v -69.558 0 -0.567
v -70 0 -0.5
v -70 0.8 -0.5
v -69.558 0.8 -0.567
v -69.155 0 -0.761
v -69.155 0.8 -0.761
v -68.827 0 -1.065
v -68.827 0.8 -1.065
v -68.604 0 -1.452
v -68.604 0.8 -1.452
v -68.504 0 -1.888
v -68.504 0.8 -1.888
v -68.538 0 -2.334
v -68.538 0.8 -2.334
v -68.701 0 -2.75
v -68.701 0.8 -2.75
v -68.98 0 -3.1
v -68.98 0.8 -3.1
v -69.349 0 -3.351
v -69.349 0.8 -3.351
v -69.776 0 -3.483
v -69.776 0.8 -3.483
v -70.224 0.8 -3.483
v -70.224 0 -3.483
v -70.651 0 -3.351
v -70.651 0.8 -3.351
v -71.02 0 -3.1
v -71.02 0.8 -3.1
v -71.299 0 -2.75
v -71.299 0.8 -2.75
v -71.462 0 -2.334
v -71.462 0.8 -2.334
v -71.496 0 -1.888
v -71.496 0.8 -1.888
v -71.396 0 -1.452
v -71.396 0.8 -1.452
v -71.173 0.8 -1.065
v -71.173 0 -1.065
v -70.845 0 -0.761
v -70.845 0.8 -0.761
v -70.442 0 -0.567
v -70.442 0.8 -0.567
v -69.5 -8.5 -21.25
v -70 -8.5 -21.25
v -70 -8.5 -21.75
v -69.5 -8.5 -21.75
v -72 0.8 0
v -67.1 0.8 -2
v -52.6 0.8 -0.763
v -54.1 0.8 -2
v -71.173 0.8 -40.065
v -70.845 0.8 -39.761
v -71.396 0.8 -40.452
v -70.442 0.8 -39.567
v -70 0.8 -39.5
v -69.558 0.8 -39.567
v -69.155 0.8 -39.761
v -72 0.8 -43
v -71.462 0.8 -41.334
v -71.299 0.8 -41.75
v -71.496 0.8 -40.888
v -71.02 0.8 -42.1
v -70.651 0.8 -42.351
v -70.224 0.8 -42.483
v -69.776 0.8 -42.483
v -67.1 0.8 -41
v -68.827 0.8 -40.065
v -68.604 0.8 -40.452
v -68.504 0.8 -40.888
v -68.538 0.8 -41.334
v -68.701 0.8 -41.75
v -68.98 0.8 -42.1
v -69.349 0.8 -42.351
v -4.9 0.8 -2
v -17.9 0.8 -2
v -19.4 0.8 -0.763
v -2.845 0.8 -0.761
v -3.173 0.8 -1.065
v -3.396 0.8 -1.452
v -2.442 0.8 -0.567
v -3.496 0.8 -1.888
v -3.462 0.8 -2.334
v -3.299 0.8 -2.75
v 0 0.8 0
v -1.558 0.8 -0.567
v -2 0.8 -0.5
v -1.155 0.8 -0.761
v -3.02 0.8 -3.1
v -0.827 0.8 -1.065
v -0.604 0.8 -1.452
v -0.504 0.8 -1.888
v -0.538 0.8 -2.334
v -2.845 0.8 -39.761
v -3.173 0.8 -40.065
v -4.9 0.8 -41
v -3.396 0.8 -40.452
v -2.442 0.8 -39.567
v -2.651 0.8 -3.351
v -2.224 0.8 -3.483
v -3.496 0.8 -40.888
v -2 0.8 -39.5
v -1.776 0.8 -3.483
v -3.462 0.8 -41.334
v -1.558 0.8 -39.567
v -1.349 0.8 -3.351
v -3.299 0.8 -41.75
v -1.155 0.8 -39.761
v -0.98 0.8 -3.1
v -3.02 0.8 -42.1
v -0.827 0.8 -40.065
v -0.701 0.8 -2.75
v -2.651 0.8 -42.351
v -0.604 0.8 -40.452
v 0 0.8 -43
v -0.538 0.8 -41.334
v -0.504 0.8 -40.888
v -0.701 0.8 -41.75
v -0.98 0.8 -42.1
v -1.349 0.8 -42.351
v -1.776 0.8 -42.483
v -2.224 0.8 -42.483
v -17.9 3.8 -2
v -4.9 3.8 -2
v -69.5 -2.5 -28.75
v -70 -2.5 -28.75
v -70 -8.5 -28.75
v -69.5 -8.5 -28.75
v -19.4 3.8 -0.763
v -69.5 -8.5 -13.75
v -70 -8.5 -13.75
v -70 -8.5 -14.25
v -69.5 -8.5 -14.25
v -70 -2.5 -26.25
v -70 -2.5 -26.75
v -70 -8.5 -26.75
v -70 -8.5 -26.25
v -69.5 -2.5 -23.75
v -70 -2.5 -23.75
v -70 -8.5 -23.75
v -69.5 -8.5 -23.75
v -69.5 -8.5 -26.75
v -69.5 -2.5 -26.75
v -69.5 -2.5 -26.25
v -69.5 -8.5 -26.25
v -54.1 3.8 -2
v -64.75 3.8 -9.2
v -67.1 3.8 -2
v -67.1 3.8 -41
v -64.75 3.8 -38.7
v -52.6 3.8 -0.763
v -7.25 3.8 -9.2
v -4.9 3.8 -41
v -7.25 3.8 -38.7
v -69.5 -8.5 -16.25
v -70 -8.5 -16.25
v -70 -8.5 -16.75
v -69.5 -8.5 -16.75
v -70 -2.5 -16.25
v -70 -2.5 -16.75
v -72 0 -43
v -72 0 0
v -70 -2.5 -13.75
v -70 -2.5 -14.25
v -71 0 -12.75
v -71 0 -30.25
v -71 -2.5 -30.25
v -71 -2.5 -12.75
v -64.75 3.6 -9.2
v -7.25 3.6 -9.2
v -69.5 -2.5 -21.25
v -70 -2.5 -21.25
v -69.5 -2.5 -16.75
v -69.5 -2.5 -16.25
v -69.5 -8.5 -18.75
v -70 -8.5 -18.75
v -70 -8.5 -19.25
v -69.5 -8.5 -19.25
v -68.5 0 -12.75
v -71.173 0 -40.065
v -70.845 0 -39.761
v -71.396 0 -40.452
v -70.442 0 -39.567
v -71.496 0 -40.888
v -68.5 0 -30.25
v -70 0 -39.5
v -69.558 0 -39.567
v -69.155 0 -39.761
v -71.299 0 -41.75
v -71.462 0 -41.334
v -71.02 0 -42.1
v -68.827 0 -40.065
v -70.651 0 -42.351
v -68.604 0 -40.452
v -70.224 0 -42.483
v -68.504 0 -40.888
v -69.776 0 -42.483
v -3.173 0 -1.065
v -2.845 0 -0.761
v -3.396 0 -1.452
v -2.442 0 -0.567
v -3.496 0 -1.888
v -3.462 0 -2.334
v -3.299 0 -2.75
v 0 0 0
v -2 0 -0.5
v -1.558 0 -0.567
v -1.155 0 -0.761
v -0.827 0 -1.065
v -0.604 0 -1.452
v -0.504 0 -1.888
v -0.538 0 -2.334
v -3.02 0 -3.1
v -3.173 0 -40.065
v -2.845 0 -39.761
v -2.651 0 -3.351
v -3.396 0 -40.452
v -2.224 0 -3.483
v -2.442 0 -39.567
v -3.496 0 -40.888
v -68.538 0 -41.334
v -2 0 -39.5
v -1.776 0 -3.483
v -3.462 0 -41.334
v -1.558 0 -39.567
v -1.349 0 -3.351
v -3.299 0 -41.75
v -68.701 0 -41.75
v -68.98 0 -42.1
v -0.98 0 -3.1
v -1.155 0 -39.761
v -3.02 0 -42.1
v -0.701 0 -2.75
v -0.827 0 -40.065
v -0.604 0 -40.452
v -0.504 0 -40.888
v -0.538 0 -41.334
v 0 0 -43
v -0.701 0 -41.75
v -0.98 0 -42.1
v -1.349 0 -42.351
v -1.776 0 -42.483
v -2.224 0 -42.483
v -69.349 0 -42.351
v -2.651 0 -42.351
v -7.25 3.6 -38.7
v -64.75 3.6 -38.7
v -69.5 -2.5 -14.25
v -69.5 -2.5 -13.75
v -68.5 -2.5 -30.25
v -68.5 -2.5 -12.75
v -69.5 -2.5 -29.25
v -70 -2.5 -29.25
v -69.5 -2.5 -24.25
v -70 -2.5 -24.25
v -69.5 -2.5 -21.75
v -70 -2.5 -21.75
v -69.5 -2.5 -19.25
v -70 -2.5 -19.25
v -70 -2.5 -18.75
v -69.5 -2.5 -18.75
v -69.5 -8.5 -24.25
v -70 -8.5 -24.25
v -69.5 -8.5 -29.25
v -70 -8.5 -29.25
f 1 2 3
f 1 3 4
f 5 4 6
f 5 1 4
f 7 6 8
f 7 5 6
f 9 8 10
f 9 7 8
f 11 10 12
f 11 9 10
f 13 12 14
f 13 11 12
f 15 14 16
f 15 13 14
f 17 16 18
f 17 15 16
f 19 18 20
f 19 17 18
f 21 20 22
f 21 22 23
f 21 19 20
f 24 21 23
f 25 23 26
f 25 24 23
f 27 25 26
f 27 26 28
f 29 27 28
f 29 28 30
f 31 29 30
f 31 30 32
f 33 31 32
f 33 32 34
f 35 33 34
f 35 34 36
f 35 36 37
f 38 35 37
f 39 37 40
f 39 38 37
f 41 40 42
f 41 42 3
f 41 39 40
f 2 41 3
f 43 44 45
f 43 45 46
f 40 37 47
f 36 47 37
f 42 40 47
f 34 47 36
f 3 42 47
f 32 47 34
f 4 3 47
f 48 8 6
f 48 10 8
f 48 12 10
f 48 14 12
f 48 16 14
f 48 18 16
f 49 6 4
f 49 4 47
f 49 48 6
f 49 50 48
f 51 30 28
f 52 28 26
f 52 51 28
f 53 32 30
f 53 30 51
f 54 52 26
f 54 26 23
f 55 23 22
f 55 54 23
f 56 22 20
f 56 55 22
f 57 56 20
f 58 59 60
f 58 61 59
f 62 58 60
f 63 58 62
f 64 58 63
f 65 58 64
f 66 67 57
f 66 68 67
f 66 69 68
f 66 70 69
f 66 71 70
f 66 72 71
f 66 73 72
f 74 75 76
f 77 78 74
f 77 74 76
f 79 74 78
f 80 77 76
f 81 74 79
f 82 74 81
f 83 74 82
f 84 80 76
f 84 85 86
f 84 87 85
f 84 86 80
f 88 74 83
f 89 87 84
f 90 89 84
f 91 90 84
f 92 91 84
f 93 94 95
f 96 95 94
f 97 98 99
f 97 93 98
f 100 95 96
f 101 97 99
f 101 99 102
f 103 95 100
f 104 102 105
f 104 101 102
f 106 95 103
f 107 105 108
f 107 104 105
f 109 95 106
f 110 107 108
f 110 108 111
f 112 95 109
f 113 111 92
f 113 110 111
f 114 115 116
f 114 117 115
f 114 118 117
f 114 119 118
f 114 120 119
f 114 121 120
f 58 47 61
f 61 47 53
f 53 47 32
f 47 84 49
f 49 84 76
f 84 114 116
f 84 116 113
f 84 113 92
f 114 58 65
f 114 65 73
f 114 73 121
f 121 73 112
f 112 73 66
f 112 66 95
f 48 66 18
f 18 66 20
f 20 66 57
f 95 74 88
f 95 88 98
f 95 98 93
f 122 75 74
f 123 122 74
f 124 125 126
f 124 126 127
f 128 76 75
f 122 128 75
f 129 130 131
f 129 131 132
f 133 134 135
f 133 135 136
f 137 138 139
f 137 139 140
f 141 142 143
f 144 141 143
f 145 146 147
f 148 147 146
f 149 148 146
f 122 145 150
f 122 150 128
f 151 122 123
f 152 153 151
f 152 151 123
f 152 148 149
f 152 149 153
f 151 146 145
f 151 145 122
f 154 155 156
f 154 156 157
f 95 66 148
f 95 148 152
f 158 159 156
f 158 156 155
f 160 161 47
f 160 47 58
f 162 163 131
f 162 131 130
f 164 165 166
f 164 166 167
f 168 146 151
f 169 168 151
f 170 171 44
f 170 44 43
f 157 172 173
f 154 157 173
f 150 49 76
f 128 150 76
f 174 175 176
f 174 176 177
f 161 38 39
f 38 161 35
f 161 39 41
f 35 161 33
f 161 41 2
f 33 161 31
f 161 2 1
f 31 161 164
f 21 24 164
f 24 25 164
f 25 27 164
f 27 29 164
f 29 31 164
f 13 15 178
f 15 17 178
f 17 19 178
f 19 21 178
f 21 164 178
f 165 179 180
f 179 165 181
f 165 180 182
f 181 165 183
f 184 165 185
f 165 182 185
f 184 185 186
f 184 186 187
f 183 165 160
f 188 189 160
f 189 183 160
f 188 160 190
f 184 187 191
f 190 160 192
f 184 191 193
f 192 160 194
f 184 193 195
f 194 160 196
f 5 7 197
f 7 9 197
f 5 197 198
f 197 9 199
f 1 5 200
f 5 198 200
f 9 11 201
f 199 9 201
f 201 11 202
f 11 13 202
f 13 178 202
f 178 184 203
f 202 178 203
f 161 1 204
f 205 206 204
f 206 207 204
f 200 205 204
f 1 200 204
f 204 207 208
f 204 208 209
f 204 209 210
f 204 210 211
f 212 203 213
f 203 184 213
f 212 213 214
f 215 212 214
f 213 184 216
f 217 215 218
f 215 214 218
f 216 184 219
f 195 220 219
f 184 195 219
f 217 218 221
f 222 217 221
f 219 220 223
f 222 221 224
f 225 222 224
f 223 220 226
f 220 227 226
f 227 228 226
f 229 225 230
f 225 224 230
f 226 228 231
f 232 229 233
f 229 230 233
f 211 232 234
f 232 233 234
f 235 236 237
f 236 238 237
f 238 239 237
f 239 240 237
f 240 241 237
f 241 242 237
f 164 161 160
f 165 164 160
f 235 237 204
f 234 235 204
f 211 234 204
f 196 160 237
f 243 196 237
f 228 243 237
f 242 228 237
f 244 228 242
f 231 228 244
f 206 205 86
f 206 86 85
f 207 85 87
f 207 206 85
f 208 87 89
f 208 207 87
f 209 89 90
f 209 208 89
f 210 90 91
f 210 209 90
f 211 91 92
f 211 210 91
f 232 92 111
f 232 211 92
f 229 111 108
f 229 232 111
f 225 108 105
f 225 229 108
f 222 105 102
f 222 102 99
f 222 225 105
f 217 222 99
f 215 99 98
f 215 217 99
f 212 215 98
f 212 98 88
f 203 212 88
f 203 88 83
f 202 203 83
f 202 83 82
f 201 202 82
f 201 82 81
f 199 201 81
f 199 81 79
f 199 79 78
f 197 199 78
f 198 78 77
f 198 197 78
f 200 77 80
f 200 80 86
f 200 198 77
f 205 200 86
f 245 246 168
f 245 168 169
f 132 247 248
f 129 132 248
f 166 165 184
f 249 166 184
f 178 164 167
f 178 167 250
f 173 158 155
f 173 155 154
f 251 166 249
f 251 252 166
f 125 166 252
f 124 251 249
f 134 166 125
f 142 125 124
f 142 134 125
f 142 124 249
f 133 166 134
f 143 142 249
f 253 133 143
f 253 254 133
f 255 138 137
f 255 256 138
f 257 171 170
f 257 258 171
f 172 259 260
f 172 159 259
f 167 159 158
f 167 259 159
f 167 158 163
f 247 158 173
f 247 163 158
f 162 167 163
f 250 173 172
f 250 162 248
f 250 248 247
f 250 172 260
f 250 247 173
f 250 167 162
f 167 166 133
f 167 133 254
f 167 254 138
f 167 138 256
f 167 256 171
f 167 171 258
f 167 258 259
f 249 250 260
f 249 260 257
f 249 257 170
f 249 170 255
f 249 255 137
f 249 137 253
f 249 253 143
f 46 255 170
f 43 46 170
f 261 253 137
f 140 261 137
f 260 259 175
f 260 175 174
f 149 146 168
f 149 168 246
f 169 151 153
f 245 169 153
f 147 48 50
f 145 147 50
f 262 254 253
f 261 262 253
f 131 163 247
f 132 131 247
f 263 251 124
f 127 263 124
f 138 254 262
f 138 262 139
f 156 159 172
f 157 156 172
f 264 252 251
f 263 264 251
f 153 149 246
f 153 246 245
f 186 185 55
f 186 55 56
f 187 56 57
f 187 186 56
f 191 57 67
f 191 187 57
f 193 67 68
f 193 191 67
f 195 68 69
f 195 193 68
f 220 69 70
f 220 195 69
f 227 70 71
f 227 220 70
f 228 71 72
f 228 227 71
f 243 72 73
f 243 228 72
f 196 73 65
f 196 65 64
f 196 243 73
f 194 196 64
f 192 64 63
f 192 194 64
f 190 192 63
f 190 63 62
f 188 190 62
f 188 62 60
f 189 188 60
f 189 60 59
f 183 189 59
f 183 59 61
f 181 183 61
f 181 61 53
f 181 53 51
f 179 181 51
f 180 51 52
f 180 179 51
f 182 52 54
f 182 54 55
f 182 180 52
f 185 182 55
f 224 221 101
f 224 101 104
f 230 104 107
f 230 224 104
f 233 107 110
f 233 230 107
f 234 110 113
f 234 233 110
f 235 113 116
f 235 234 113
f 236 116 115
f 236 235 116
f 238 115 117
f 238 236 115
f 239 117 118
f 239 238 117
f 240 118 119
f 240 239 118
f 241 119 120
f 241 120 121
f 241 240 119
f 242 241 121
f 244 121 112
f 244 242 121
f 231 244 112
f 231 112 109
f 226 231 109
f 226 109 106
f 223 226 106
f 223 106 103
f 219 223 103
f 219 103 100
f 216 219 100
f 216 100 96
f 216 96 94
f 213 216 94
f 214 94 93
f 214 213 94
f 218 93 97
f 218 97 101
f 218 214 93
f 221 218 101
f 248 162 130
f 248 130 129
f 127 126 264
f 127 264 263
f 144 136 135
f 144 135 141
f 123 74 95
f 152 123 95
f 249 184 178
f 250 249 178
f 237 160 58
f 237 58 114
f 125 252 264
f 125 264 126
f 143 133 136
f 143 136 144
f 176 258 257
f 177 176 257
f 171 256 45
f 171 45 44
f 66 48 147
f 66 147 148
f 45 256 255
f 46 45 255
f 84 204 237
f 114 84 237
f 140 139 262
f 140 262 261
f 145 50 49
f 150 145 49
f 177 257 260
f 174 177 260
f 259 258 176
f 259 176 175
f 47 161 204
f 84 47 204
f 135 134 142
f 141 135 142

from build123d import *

# Parameters (mm, degrees)
SKETCH1_W           = 72
SKETCH1_H           = 43
SKETCH1_R           = 1.5
BOSS_EXTRUDE1_DEPTH = 0.8
SKETCH2_W           = 62.2
SKETCH2_H           = 39
SKETCH2_W_2         = 33.2
SKETCH2_H_2         = 1.237316914
BOSS_EXTRUDE2_DEPTH = 3
SKETCH3_W           = 57.5
SKETCH3_H           = 29.5
CUT_EXTRUDE1_DEPTH  = 0.2
SKETCH4_W           = 2.5
SKETCH4_H           = 17.5
BOSS_EXTRUDE3_DEPTH = 2.5
SKETCH5_W           = 0.5
SKETCH5_H           = 0.5
BOSS_EXTRUDE4_DEPTH = 6
LPATTERN1_COUNT     = 7
LPATTERN1_PITCH     = 2.5


with BuildPart() as part:
    # Sketch1 → Boss-Extrude1 (new body)
    with BuildSketch(Plane(origin=(0, 0, 0), x_dir=(1, 0, 0), z_dir=(0, 1, 0))):
        with Locations((-36, 21.5)):
            Rectangle(SKETCH1_W, SKETCH1_H)
        with Locations(Location((-70, 41, 0), (0, 0, 270))):
            Circle(SKETCH1_R, mode=Mode.SUBTRACT)
        with Locations(Location((-2, 41, 0), (0, 0, 270))):
            Circle(SKETCH1_R, mode=Mode.SUBTRACT)
        with Locations(Location((-2, 2, 0), (0, 0, 270))):
            Circle(SKETCH1_R, mode=Mode.SUBTRACT)
        with Locations(Location((-70, 2, 0), (0, 0, 270))):
            Circle(SKETCH1_R, mode=Mode.SUBTRACT)
    extrude(amount=BOSS_EXTRUDE1_DEPTH)

    # Sketch2 → Boss-Extrude2 (add)
    with BuildSketch(Plane(origin=(0, 0.8, 0), x_dir=(1, 0, 0), z_dir=(0, 1, 0))):
        with Locations((-36, 21.5)):
            Rectangle(SKETCH2_W, SKETCH2_H)
        with Locations((-36, 1.381341543)):
            Rectangle(SKETCH2_W_2, SKETCH2_H_2)
        Polygon((-19.4, 0.762683086), (-17.9, 2), (-19.4, 2), align=None)
        Polygon((-52.6, 2), (-54.1, 2), (-52.6, 0.762683086), align=None)
    extrude(amount=BOSS_EXTRUDE2_DEPTH)

    # Sketch3 → Cut-Extrude1 (cut)
    with BuildSketch(Plane(origin=(0, 3.8, 0), x_dir=(1, 0, 0), z_dir=(0, 1, 0))):
        with Locations((-36, 23.95)):
            Rectangle(SKETCH3_W, SKETCH3_H)
    extrude(amount=-CUT_EXTRUDE1_DEPTH, mode=Mode.SUBTRACT)

    # Sketch4 → Boss-Extrude3 (add)
    with BuildSketch(Plane.XZ):
        with Locations((-69.75, -21.5)):
            Rectangle(SKETCH4_W, SKETCH4_H)
    extrude(amount=BOSS_EXTRUDE3_DEPTH)

    # Sketch5 → Boss-Extrude4 (add)
    with BuildSketch(Plane.XZ.offset(2.5)):
        with Locations((-69.75, -14)):
            Rectangle(SKETCH5_W, SKETCH5_H)
    boss_extrude4 = extrude(amount=BOSS_EXTRUDE4_DEPTH)

    # LPattern1: Boss-Extrude4 ×7
    with Locations(*[(0, 0, -i * LPATTERN1_PITCH) for i in range(1, LPATTERN1_COUNT)]):
        add(boss_extrude4)


solid = part.part
